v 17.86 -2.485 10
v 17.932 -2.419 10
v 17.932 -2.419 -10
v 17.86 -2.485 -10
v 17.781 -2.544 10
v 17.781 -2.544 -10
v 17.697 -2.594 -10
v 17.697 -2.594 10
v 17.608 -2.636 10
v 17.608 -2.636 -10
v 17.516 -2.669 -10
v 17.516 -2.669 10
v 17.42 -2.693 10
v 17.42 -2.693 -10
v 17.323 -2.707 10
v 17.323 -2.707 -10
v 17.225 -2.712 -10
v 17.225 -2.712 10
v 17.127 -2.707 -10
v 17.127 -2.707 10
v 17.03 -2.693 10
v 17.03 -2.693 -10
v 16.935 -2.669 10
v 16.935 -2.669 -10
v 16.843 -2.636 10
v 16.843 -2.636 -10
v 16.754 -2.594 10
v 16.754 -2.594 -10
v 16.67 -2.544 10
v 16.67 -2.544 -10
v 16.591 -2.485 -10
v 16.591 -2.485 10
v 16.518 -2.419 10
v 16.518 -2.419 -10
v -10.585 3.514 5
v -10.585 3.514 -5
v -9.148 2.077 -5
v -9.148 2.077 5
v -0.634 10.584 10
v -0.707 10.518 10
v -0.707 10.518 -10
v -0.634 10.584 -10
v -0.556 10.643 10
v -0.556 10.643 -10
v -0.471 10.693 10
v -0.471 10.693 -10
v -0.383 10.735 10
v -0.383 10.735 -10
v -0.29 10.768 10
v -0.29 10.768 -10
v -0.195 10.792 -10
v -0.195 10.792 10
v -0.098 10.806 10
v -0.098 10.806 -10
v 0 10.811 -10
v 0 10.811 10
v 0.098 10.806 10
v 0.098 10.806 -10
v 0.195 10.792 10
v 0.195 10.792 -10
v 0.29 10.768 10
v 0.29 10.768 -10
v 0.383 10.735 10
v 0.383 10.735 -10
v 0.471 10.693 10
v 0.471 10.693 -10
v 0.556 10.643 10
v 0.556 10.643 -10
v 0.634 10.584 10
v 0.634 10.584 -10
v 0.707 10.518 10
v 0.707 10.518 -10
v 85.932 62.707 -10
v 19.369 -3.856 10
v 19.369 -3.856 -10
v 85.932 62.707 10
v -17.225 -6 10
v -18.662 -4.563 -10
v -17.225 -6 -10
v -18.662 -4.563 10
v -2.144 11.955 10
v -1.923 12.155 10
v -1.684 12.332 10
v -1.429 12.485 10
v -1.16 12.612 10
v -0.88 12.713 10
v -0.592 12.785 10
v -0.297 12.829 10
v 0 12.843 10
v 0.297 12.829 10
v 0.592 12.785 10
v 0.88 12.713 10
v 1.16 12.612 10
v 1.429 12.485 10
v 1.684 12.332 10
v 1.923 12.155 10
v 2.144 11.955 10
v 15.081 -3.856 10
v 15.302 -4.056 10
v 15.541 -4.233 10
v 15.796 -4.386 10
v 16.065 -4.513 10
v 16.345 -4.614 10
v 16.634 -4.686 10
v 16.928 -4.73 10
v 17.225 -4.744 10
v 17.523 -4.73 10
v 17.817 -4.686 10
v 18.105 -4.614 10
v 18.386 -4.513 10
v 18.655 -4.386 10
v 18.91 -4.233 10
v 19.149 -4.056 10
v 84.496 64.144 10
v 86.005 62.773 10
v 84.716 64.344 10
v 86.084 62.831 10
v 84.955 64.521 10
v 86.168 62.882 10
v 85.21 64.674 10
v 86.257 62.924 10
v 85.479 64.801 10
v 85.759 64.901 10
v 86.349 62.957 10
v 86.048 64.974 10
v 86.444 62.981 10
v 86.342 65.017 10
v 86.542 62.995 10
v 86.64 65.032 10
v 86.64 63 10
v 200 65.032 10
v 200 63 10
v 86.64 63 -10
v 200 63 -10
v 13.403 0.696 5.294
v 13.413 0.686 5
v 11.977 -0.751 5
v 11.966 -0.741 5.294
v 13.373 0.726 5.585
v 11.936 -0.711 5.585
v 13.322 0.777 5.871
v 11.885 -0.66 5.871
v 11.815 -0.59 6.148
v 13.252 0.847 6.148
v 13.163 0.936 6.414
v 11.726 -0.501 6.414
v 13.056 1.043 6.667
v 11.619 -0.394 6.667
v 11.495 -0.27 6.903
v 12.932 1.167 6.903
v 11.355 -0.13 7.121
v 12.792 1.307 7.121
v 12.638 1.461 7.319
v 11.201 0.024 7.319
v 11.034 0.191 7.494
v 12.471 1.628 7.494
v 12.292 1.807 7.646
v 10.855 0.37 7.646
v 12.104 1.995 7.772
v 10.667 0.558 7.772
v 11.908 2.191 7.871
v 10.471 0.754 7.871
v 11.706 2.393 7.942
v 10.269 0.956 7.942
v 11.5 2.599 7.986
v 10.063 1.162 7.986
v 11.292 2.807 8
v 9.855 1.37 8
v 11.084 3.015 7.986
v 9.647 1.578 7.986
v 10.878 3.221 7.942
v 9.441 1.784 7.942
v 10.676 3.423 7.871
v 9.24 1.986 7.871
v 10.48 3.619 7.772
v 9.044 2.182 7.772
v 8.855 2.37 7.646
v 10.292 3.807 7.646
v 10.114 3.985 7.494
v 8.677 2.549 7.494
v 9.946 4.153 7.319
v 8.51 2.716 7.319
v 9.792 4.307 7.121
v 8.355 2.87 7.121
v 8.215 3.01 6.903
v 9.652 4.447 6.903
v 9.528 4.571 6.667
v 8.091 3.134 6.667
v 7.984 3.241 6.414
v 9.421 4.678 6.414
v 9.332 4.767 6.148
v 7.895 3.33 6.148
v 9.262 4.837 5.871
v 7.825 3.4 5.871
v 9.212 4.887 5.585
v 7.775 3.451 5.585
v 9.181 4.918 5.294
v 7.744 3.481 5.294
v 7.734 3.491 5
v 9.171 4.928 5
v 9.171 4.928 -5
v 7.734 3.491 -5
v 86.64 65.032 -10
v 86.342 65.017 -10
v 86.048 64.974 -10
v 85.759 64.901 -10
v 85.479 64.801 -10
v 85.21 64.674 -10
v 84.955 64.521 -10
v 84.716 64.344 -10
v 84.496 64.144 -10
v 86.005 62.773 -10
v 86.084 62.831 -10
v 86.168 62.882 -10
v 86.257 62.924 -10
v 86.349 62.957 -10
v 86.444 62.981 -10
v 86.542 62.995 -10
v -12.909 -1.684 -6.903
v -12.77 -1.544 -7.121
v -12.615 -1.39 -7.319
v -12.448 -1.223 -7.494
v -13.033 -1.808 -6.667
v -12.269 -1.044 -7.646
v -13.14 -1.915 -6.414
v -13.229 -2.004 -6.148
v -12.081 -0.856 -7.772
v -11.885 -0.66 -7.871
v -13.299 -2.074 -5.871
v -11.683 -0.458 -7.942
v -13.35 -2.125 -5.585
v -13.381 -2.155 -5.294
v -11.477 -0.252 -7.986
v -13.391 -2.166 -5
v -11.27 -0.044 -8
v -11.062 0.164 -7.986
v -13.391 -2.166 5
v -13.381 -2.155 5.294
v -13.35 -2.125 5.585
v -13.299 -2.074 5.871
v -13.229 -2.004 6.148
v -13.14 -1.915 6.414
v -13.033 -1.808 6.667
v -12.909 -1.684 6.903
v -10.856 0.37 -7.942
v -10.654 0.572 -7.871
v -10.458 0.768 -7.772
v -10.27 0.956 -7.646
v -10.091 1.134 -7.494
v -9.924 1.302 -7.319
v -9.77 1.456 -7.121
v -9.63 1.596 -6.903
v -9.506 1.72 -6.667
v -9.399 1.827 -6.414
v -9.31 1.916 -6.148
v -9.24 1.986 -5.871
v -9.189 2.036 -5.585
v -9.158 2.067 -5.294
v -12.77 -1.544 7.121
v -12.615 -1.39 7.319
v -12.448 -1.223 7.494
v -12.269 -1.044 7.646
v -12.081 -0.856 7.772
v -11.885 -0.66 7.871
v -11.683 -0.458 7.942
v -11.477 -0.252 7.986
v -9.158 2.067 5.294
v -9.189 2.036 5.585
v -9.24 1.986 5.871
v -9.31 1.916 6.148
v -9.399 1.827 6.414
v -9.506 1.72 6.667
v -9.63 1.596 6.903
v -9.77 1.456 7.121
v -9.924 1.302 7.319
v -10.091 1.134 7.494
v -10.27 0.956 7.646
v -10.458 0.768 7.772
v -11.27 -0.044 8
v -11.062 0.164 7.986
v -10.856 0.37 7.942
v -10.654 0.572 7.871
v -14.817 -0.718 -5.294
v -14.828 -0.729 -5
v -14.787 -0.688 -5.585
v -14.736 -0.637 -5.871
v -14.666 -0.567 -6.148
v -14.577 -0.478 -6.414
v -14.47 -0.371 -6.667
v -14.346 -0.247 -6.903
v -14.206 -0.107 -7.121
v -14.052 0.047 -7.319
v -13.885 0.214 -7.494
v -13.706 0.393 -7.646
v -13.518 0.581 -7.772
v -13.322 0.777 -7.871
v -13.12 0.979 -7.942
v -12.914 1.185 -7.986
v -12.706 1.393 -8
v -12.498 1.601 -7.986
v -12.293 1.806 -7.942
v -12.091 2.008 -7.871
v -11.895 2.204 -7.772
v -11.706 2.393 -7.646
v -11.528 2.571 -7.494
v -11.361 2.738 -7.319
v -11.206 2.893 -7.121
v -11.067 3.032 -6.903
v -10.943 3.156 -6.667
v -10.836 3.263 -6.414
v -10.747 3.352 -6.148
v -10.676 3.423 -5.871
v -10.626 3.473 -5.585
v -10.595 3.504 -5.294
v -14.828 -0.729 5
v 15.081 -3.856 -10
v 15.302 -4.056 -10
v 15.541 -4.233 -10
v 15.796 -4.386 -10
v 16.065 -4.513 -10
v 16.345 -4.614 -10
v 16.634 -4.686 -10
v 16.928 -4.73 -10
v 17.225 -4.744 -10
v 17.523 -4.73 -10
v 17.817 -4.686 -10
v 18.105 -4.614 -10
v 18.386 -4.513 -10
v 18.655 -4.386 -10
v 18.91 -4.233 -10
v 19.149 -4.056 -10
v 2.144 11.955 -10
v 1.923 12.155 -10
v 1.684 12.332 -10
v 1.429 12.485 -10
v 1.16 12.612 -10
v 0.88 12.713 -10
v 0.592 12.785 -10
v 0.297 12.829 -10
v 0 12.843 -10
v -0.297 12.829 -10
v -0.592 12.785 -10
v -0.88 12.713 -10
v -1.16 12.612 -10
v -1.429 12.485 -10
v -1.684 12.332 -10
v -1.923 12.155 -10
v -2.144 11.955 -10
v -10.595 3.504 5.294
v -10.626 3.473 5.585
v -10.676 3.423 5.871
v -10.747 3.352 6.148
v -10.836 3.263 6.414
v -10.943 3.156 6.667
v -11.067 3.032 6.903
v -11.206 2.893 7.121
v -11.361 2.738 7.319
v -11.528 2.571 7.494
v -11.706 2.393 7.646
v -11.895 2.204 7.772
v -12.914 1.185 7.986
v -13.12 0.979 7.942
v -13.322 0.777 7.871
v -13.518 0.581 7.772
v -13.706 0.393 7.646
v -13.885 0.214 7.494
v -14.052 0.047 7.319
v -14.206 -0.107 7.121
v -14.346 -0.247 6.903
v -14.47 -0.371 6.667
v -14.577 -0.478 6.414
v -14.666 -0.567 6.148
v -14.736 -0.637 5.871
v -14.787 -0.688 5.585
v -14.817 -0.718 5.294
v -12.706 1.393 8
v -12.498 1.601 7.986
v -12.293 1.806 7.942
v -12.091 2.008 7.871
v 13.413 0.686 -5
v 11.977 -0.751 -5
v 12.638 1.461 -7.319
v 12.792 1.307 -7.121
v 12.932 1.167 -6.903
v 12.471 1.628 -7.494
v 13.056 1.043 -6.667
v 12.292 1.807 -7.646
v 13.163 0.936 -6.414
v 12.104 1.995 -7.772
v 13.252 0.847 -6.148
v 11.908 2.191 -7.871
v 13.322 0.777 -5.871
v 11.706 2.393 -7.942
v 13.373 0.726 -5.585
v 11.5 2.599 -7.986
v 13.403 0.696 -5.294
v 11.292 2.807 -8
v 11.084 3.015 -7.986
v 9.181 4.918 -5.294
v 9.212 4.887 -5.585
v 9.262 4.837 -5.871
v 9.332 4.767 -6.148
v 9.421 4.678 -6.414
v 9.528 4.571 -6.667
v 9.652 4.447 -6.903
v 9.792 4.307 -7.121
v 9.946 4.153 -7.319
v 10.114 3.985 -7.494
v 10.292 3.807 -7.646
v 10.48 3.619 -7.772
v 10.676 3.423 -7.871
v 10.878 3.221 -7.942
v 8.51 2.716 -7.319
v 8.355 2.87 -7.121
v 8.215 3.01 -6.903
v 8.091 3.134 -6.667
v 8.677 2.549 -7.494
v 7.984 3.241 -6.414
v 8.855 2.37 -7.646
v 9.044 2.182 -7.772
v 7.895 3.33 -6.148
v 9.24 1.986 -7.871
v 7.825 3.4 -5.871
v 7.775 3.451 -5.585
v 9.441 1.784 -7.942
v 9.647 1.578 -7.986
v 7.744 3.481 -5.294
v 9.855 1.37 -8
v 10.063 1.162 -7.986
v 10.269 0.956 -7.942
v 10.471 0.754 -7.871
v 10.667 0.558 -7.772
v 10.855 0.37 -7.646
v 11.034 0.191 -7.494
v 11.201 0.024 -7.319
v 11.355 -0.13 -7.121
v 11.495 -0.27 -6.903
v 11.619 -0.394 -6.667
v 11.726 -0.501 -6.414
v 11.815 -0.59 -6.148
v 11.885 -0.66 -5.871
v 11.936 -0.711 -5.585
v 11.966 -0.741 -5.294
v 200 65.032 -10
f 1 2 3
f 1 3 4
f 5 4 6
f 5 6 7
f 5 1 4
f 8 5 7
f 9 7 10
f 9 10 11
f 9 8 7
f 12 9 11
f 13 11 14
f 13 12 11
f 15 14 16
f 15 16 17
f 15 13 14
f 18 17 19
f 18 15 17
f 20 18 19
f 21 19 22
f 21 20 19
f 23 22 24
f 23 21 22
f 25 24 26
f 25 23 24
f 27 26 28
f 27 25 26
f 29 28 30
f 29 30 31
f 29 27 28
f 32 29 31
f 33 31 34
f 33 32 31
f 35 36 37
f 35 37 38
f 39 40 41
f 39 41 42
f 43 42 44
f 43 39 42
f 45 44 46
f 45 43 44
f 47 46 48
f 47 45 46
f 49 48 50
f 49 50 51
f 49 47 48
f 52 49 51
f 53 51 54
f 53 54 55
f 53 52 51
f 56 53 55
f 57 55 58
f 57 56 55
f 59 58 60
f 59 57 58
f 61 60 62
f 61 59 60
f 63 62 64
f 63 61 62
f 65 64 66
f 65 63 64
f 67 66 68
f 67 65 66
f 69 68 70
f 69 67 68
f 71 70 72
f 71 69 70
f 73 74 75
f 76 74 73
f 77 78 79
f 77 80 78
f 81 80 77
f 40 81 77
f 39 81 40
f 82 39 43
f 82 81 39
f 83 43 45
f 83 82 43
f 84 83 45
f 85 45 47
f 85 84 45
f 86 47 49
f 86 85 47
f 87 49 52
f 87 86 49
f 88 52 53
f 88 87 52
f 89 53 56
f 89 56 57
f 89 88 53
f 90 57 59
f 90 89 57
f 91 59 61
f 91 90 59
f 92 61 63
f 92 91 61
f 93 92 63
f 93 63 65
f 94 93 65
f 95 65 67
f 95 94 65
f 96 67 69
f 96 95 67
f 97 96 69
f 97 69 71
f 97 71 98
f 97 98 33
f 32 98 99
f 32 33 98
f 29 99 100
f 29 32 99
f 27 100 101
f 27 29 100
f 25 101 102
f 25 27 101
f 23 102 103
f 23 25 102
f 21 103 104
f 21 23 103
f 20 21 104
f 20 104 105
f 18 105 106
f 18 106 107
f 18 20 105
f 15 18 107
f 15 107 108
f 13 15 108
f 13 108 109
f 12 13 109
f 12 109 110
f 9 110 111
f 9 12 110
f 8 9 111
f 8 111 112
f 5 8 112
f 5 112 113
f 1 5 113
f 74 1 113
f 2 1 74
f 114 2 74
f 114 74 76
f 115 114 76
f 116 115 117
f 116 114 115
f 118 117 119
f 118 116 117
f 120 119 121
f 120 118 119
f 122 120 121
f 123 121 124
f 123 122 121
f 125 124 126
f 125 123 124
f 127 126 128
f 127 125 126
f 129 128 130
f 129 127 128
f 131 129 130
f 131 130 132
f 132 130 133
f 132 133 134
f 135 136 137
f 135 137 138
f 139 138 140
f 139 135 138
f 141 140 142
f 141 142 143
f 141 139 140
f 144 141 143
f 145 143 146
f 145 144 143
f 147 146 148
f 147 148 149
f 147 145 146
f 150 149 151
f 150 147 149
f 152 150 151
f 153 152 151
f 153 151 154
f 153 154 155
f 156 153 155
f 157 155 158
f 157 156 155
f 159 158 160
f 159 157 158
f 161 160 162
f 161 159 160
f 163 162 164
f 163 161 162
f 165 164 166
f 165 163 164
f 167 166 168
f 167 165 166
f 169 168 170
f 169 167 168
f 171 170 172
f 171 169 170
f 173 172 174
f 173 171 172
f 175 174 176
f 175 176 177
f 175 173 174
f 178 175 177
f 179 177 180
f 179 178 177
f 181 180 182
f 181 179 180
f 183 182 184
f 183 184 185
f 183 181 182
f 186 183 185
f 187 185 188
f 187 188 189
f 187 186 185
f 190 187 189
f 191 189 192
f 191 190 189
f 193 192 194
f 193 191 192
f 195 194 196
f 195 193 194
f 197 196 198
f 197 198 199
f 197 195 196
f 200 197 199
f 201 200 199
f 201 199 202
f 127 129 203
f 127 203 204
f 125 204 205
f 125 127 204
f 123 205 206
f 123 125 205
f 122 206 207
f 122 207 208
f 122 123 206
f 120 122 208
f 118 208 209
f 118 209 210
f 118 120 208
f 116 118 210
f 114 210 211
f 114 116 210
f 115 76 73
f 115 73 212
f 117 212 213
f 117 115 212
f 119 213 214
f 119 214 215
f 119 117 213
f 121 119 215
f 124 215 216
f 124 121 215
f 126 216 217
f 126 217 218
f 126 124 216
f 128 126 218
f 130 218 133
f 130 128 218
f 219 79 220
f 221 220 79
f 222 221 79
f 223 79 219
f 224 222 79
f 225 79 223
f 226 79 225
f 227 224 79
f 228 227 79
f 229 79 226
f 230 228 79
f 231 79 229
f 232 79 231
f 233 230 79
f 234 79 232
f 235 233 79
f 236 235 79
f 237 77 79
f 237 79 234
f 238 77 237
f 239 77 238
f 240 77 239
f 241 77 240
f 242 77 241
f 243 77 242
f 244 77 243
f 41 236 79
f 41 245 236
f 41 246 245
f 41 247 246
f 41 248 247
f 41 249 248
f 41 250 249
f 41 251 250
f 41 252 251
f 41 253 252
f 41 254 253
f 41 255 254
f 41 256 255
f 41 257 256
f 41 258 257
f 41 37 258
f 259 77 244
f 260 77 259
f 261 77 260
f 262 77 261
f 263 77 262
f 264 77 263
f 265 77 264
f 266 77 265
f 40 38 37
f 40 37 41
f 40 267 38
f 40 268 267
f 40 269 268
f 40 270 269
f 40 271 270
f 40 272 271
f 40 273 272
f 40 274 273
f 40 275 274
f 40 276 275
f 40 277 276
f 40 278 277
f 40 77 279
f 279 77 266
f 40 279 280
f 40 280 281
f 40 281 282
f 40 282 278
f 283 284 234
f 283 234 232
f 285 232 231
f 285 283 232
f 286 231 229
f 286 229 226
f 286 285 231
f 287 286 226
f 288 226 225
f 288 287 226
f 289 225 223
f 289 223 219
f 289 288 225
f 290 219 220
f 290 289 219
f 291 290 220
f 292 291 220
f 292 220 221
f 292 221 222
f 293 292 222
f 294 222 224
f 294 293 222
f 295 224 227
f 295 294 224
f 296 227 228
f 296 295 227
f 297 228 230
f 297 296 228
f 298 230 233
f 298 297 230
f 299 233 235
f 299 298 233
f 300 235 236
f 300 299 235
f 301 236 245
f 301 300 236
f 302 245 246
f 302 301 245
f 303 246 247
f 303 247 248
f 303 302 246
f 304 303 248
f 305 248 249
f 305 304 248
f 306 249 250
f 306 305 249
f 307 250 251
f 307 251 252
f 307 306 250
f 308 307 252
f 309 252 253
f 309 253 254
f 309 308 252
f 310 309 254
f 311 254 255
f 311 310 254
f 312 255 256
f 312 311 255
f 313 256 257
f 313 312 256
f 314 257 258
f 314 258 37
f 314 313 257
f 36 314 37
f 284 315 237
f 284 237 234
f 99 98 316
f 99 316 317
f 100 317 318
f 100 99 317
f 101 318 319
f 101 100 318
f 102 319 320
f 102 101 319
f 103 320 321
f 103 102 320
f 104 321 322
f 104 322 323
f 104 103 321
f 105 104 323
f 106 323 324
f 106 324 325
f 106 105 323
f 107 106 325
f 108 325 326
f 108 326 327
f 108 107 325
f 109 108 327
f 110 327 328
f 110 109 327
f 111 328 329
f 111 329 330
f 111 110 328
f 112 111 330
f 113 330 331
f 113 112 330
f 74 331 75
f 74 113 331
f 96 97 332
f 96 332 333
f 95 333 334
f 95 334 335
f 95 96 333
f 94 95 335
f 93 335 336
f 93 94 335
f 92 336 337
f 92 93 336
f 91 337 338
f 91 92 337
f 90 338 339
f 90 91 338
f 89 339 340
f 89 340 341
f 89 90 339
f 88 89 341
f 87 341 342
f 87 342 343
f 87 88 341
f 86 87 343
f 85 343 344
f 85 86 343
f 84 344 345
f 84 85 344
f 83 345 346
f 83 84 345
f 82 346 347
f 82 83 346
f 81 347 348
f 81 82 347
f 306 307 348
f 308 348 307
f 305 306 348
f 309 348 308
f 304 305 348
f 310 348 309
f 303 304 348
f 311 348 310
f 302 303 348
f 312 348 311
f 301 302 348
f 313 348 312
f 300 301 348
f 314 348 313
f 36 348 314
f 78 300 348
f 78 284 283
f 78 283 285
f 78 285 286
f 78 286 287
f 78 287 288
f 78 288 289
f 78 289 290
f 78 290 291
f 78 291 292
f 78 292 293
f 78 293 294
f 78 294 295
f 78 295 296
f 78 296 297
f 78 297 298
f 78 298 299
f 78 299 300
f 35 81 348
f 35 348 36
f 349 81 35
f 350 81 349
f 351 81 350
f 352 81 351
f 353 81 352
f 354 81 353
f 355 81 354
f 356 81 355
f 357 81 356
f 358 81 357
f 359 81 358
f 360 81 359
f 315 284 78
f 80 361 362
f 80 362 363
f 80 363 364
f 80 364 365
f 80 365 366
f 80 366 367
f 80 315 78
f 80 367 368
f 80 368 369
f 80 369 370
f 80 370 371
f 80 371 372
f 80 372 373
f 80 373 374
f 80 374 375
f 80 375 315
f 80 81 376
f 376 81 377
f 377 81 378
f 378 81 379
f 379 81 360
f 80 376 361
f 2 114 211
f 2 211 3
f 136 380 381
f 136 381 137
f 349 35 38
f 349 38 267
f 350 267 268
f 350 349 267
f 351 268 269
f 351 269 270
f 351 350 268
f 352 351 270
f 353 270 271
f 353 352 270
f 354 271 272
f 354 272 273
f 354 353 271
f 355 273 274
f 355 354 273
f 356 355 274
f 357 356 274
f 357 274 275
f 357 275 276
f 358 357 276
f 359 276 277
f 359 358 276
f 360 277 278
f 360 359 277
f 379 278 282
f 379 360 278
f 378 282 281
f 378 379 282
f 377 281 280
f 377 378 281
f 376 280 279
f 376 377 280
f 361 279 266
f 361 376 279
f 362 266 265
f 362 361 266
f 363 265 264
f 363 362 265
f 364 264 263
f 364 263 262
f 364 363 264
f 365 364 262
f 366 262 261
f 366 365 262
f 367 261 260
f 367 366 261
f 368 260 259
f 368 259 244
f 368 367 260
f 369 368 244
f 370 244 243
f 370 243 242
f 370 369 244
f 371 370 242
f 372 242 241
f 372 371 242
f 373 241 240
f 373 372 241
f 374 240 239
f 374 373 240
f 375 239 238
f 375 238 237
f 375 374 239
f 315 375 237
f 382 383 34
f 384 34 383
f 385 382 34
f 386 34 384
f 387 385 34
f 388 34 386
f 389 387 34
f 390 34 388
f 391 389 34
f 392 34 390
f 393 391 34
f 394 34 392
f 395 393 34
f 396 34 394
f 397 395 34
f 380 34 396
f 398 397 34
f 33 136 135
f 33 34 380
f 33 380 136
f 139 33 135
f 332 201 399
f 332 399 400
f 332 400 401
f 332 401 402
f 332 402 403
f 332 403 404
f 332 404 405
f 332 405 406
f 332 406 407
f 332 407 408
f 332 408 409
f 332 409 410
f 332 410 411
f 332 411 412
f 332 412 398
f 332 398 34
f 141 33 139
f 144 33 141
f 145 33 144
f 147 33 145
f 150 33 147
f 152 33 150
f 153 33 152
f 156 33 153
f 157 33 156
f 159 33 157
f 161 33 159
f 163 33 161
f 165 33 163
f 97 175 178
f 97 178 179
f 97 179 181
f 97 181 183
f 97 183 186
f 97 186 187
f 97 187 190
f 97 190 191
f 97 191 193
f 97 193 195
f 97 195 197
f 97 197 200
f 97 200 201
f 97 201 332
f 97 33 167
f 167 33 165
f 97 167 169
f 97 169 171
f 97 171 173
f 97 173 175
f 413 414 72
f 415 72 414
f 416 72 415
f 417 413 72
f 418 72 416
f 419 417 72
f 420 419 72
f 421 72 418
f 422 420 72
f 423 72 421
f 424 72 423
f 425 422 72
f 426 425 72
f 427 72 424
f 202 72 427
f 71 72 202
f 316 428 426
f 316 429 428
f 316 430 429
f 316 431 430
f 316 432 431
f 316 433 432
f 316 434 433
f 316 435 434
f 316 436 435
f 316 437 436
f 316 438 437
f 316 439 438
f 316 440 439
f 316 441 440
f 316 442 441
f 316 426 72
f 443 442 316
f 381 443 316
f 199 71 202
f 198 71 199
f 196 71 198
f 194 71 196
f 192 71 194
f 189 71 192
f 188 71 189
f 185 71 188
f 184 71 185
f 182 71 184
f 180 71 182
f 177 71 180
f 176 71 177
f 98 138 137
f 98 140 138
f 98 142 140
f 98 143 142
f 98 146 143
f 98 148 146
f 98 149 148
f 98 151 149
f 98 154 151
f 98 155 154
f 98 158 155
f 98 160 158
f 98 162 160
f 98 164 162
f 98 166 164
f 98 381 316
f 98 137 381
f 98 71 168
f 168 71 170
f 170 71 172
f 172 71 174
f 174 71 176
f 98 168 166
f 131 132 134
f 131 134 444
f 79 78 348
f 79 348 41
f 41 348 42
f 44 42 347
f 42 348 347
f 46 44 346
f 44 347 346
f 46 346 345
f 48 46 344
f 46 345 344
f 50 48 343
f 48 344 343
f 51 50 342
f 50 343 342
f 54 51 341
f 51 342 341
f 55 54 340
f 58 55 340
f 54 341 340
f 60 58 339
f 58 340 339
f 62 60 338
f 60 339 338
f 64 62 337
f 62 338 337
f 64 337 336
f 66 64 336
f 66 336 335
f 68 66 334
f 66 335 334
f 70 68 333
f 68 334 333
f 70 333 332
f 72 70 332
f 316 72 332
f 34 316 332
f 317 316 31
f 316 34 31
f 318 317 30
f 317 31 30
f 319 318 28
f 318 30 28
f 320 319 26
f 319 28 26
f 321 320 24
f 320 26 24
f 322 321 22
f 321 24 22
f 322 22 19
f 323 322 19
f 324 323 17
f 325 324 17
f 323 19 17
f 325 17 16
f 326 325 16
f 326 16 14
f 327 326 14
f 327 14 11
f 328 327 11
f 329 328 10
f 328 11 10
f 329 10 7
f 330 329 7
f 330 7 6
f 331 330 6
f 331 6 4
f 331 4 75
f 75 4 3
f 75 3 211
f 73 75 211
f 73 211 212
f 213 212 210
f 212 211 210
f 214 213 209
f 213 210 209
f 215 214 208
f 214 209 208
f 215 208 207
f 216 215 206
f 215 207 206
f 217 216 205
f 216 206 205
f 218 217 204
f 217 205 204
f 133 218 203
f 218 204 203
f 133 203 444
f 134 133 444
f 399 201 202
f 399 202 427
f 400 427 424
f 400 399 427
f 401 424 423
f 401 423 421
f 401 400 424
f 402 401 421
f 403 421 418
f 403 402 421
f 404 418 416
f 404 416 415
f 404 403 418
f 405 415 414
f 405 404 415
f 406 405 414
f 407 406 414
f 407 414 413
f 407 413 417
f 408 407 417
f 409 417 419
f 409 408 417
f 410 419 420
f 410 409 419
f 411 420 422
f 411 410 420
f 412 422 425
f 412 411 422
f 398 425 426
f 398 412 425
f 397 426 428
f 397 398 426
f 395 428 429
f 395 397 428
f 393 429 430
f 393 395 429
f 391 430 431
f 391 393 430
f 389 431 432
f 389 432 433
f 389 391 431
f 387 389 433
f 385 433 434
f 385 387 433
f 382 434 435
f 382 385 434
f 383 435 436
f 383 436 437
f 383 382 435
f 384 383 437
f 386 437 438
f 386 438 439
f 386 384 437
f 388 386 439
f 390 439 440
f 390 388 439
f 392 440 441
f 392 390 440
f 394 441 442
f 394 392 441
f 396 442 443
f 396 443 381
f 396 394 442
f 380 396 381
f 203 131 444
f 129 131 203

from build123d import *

# Parameters (mm, degrees)
BASE_FLANGE1_DEPTH = 10
CUT_EXTRUDE1_DEPTH = 2.032
CUT_EXTRUDE2_DEPTH = 2.032


# Sheet-metal steps are written as plain solids
with BuildPart() as part:
    # Sketch1 → Base-Flange1 (new, symmetric)
    with BuildSketch(Plane.XY):
        with BuildLine():
            Line((-17.225320151, -6), (-0.707106781, 10.51821337))
            ThreePointArc((-0.707106781, 10.51821337), (0, 10.811106589), (0.707106781, 10.51821337))
            Line((0.707106781, 10.51821337), (15.081372391, -3.856052239))
            ThreePointArc((15.081372391, -3.856052239), (17.225320151, -4.744104479), (19.369267912, -3.856052239))
            Line((19.369267912, -3.856052239), (85.932426933, 62.707106781))
            ThreePointArc((85.932426933, 62.707106781), (86.256850281, 62.923879533), (86.639533714, 63))
            Line((86.639533714, 63), (200, 63))
            Line((200, 63), (200, 65.032))
            Line((200, 65.032), (86.639533714, 65.032))
            ThreePointArc((86.639533714, 65.032), (85.479237547, 64.801202743), (84.495585953, 64.143947761))
            Line((84.495585953, 64.143947761), (17.932426933, -2.41921126))
            ThreePointArc((17.932426933, -2.41921126), (17.225320151, -2.712104479), (16.51821337, -2.41921126))
            Line((16.51821337, -2.41921126), (2.143947761, 11.95505435))
            ThreePointArc((2.143947761, 11.95505435), (0, 12.843106589), (-2.143947761, 11.95505435))
            Line((-2.143947761, 11.95505435), (-18.662161131, -4.563159021))
            Line((-18.662161131, -4.563159021), (-17.225320151, -6))
        make_face()
    extrude(amount=BASE_FLANGE1_DEPTH, both=True)

    # Sketch6 → Cut-Extrude1 (cut)
    with BuildSketch(Plane(origin=(-7.049501055, 7.049501055, 0), x_dir=(0, 0, 1), z_dir=(-0.7071067811865488, 0.7071067811865464, 0))):
        with BuildLine():
            Line((-5, -5), (5, -5))
            ThreePointArc((5, -5), (8, -8), (5, -11))
            Line((5, -11), (-5, -11))
            ThreePointArc((-5, -11), (-8, -8), (-5, -5))
        make_face()
    extrude(amount=-CUT_EXTRUDE1_DEPTH, mode=Mode.SUBTRACT)

    # Sketch9 → Cut-Extrude2 (cut)
    with BuildSketch(Plane(origin=(7.049501055, 7.049501055, 0), x_dir=(0, 0, -1), z_dir=(0.7071067811865488, 0.7071067811865464, 0))):
        with BuildLine():
            Line((-5, -3), (5, -3))
            ThreePointArc((5, -3), (8, -6), (5, -9))
            Line((5, -9), (-5, -9))
            ThreePointArc((-5, -9), (-8, -6), (-5, -3))
        make_face()
    extrude(amount=-CUT_EXTRUDE2_DEPTH, mode=Mode.SUBTRACT)


solid = part.part
